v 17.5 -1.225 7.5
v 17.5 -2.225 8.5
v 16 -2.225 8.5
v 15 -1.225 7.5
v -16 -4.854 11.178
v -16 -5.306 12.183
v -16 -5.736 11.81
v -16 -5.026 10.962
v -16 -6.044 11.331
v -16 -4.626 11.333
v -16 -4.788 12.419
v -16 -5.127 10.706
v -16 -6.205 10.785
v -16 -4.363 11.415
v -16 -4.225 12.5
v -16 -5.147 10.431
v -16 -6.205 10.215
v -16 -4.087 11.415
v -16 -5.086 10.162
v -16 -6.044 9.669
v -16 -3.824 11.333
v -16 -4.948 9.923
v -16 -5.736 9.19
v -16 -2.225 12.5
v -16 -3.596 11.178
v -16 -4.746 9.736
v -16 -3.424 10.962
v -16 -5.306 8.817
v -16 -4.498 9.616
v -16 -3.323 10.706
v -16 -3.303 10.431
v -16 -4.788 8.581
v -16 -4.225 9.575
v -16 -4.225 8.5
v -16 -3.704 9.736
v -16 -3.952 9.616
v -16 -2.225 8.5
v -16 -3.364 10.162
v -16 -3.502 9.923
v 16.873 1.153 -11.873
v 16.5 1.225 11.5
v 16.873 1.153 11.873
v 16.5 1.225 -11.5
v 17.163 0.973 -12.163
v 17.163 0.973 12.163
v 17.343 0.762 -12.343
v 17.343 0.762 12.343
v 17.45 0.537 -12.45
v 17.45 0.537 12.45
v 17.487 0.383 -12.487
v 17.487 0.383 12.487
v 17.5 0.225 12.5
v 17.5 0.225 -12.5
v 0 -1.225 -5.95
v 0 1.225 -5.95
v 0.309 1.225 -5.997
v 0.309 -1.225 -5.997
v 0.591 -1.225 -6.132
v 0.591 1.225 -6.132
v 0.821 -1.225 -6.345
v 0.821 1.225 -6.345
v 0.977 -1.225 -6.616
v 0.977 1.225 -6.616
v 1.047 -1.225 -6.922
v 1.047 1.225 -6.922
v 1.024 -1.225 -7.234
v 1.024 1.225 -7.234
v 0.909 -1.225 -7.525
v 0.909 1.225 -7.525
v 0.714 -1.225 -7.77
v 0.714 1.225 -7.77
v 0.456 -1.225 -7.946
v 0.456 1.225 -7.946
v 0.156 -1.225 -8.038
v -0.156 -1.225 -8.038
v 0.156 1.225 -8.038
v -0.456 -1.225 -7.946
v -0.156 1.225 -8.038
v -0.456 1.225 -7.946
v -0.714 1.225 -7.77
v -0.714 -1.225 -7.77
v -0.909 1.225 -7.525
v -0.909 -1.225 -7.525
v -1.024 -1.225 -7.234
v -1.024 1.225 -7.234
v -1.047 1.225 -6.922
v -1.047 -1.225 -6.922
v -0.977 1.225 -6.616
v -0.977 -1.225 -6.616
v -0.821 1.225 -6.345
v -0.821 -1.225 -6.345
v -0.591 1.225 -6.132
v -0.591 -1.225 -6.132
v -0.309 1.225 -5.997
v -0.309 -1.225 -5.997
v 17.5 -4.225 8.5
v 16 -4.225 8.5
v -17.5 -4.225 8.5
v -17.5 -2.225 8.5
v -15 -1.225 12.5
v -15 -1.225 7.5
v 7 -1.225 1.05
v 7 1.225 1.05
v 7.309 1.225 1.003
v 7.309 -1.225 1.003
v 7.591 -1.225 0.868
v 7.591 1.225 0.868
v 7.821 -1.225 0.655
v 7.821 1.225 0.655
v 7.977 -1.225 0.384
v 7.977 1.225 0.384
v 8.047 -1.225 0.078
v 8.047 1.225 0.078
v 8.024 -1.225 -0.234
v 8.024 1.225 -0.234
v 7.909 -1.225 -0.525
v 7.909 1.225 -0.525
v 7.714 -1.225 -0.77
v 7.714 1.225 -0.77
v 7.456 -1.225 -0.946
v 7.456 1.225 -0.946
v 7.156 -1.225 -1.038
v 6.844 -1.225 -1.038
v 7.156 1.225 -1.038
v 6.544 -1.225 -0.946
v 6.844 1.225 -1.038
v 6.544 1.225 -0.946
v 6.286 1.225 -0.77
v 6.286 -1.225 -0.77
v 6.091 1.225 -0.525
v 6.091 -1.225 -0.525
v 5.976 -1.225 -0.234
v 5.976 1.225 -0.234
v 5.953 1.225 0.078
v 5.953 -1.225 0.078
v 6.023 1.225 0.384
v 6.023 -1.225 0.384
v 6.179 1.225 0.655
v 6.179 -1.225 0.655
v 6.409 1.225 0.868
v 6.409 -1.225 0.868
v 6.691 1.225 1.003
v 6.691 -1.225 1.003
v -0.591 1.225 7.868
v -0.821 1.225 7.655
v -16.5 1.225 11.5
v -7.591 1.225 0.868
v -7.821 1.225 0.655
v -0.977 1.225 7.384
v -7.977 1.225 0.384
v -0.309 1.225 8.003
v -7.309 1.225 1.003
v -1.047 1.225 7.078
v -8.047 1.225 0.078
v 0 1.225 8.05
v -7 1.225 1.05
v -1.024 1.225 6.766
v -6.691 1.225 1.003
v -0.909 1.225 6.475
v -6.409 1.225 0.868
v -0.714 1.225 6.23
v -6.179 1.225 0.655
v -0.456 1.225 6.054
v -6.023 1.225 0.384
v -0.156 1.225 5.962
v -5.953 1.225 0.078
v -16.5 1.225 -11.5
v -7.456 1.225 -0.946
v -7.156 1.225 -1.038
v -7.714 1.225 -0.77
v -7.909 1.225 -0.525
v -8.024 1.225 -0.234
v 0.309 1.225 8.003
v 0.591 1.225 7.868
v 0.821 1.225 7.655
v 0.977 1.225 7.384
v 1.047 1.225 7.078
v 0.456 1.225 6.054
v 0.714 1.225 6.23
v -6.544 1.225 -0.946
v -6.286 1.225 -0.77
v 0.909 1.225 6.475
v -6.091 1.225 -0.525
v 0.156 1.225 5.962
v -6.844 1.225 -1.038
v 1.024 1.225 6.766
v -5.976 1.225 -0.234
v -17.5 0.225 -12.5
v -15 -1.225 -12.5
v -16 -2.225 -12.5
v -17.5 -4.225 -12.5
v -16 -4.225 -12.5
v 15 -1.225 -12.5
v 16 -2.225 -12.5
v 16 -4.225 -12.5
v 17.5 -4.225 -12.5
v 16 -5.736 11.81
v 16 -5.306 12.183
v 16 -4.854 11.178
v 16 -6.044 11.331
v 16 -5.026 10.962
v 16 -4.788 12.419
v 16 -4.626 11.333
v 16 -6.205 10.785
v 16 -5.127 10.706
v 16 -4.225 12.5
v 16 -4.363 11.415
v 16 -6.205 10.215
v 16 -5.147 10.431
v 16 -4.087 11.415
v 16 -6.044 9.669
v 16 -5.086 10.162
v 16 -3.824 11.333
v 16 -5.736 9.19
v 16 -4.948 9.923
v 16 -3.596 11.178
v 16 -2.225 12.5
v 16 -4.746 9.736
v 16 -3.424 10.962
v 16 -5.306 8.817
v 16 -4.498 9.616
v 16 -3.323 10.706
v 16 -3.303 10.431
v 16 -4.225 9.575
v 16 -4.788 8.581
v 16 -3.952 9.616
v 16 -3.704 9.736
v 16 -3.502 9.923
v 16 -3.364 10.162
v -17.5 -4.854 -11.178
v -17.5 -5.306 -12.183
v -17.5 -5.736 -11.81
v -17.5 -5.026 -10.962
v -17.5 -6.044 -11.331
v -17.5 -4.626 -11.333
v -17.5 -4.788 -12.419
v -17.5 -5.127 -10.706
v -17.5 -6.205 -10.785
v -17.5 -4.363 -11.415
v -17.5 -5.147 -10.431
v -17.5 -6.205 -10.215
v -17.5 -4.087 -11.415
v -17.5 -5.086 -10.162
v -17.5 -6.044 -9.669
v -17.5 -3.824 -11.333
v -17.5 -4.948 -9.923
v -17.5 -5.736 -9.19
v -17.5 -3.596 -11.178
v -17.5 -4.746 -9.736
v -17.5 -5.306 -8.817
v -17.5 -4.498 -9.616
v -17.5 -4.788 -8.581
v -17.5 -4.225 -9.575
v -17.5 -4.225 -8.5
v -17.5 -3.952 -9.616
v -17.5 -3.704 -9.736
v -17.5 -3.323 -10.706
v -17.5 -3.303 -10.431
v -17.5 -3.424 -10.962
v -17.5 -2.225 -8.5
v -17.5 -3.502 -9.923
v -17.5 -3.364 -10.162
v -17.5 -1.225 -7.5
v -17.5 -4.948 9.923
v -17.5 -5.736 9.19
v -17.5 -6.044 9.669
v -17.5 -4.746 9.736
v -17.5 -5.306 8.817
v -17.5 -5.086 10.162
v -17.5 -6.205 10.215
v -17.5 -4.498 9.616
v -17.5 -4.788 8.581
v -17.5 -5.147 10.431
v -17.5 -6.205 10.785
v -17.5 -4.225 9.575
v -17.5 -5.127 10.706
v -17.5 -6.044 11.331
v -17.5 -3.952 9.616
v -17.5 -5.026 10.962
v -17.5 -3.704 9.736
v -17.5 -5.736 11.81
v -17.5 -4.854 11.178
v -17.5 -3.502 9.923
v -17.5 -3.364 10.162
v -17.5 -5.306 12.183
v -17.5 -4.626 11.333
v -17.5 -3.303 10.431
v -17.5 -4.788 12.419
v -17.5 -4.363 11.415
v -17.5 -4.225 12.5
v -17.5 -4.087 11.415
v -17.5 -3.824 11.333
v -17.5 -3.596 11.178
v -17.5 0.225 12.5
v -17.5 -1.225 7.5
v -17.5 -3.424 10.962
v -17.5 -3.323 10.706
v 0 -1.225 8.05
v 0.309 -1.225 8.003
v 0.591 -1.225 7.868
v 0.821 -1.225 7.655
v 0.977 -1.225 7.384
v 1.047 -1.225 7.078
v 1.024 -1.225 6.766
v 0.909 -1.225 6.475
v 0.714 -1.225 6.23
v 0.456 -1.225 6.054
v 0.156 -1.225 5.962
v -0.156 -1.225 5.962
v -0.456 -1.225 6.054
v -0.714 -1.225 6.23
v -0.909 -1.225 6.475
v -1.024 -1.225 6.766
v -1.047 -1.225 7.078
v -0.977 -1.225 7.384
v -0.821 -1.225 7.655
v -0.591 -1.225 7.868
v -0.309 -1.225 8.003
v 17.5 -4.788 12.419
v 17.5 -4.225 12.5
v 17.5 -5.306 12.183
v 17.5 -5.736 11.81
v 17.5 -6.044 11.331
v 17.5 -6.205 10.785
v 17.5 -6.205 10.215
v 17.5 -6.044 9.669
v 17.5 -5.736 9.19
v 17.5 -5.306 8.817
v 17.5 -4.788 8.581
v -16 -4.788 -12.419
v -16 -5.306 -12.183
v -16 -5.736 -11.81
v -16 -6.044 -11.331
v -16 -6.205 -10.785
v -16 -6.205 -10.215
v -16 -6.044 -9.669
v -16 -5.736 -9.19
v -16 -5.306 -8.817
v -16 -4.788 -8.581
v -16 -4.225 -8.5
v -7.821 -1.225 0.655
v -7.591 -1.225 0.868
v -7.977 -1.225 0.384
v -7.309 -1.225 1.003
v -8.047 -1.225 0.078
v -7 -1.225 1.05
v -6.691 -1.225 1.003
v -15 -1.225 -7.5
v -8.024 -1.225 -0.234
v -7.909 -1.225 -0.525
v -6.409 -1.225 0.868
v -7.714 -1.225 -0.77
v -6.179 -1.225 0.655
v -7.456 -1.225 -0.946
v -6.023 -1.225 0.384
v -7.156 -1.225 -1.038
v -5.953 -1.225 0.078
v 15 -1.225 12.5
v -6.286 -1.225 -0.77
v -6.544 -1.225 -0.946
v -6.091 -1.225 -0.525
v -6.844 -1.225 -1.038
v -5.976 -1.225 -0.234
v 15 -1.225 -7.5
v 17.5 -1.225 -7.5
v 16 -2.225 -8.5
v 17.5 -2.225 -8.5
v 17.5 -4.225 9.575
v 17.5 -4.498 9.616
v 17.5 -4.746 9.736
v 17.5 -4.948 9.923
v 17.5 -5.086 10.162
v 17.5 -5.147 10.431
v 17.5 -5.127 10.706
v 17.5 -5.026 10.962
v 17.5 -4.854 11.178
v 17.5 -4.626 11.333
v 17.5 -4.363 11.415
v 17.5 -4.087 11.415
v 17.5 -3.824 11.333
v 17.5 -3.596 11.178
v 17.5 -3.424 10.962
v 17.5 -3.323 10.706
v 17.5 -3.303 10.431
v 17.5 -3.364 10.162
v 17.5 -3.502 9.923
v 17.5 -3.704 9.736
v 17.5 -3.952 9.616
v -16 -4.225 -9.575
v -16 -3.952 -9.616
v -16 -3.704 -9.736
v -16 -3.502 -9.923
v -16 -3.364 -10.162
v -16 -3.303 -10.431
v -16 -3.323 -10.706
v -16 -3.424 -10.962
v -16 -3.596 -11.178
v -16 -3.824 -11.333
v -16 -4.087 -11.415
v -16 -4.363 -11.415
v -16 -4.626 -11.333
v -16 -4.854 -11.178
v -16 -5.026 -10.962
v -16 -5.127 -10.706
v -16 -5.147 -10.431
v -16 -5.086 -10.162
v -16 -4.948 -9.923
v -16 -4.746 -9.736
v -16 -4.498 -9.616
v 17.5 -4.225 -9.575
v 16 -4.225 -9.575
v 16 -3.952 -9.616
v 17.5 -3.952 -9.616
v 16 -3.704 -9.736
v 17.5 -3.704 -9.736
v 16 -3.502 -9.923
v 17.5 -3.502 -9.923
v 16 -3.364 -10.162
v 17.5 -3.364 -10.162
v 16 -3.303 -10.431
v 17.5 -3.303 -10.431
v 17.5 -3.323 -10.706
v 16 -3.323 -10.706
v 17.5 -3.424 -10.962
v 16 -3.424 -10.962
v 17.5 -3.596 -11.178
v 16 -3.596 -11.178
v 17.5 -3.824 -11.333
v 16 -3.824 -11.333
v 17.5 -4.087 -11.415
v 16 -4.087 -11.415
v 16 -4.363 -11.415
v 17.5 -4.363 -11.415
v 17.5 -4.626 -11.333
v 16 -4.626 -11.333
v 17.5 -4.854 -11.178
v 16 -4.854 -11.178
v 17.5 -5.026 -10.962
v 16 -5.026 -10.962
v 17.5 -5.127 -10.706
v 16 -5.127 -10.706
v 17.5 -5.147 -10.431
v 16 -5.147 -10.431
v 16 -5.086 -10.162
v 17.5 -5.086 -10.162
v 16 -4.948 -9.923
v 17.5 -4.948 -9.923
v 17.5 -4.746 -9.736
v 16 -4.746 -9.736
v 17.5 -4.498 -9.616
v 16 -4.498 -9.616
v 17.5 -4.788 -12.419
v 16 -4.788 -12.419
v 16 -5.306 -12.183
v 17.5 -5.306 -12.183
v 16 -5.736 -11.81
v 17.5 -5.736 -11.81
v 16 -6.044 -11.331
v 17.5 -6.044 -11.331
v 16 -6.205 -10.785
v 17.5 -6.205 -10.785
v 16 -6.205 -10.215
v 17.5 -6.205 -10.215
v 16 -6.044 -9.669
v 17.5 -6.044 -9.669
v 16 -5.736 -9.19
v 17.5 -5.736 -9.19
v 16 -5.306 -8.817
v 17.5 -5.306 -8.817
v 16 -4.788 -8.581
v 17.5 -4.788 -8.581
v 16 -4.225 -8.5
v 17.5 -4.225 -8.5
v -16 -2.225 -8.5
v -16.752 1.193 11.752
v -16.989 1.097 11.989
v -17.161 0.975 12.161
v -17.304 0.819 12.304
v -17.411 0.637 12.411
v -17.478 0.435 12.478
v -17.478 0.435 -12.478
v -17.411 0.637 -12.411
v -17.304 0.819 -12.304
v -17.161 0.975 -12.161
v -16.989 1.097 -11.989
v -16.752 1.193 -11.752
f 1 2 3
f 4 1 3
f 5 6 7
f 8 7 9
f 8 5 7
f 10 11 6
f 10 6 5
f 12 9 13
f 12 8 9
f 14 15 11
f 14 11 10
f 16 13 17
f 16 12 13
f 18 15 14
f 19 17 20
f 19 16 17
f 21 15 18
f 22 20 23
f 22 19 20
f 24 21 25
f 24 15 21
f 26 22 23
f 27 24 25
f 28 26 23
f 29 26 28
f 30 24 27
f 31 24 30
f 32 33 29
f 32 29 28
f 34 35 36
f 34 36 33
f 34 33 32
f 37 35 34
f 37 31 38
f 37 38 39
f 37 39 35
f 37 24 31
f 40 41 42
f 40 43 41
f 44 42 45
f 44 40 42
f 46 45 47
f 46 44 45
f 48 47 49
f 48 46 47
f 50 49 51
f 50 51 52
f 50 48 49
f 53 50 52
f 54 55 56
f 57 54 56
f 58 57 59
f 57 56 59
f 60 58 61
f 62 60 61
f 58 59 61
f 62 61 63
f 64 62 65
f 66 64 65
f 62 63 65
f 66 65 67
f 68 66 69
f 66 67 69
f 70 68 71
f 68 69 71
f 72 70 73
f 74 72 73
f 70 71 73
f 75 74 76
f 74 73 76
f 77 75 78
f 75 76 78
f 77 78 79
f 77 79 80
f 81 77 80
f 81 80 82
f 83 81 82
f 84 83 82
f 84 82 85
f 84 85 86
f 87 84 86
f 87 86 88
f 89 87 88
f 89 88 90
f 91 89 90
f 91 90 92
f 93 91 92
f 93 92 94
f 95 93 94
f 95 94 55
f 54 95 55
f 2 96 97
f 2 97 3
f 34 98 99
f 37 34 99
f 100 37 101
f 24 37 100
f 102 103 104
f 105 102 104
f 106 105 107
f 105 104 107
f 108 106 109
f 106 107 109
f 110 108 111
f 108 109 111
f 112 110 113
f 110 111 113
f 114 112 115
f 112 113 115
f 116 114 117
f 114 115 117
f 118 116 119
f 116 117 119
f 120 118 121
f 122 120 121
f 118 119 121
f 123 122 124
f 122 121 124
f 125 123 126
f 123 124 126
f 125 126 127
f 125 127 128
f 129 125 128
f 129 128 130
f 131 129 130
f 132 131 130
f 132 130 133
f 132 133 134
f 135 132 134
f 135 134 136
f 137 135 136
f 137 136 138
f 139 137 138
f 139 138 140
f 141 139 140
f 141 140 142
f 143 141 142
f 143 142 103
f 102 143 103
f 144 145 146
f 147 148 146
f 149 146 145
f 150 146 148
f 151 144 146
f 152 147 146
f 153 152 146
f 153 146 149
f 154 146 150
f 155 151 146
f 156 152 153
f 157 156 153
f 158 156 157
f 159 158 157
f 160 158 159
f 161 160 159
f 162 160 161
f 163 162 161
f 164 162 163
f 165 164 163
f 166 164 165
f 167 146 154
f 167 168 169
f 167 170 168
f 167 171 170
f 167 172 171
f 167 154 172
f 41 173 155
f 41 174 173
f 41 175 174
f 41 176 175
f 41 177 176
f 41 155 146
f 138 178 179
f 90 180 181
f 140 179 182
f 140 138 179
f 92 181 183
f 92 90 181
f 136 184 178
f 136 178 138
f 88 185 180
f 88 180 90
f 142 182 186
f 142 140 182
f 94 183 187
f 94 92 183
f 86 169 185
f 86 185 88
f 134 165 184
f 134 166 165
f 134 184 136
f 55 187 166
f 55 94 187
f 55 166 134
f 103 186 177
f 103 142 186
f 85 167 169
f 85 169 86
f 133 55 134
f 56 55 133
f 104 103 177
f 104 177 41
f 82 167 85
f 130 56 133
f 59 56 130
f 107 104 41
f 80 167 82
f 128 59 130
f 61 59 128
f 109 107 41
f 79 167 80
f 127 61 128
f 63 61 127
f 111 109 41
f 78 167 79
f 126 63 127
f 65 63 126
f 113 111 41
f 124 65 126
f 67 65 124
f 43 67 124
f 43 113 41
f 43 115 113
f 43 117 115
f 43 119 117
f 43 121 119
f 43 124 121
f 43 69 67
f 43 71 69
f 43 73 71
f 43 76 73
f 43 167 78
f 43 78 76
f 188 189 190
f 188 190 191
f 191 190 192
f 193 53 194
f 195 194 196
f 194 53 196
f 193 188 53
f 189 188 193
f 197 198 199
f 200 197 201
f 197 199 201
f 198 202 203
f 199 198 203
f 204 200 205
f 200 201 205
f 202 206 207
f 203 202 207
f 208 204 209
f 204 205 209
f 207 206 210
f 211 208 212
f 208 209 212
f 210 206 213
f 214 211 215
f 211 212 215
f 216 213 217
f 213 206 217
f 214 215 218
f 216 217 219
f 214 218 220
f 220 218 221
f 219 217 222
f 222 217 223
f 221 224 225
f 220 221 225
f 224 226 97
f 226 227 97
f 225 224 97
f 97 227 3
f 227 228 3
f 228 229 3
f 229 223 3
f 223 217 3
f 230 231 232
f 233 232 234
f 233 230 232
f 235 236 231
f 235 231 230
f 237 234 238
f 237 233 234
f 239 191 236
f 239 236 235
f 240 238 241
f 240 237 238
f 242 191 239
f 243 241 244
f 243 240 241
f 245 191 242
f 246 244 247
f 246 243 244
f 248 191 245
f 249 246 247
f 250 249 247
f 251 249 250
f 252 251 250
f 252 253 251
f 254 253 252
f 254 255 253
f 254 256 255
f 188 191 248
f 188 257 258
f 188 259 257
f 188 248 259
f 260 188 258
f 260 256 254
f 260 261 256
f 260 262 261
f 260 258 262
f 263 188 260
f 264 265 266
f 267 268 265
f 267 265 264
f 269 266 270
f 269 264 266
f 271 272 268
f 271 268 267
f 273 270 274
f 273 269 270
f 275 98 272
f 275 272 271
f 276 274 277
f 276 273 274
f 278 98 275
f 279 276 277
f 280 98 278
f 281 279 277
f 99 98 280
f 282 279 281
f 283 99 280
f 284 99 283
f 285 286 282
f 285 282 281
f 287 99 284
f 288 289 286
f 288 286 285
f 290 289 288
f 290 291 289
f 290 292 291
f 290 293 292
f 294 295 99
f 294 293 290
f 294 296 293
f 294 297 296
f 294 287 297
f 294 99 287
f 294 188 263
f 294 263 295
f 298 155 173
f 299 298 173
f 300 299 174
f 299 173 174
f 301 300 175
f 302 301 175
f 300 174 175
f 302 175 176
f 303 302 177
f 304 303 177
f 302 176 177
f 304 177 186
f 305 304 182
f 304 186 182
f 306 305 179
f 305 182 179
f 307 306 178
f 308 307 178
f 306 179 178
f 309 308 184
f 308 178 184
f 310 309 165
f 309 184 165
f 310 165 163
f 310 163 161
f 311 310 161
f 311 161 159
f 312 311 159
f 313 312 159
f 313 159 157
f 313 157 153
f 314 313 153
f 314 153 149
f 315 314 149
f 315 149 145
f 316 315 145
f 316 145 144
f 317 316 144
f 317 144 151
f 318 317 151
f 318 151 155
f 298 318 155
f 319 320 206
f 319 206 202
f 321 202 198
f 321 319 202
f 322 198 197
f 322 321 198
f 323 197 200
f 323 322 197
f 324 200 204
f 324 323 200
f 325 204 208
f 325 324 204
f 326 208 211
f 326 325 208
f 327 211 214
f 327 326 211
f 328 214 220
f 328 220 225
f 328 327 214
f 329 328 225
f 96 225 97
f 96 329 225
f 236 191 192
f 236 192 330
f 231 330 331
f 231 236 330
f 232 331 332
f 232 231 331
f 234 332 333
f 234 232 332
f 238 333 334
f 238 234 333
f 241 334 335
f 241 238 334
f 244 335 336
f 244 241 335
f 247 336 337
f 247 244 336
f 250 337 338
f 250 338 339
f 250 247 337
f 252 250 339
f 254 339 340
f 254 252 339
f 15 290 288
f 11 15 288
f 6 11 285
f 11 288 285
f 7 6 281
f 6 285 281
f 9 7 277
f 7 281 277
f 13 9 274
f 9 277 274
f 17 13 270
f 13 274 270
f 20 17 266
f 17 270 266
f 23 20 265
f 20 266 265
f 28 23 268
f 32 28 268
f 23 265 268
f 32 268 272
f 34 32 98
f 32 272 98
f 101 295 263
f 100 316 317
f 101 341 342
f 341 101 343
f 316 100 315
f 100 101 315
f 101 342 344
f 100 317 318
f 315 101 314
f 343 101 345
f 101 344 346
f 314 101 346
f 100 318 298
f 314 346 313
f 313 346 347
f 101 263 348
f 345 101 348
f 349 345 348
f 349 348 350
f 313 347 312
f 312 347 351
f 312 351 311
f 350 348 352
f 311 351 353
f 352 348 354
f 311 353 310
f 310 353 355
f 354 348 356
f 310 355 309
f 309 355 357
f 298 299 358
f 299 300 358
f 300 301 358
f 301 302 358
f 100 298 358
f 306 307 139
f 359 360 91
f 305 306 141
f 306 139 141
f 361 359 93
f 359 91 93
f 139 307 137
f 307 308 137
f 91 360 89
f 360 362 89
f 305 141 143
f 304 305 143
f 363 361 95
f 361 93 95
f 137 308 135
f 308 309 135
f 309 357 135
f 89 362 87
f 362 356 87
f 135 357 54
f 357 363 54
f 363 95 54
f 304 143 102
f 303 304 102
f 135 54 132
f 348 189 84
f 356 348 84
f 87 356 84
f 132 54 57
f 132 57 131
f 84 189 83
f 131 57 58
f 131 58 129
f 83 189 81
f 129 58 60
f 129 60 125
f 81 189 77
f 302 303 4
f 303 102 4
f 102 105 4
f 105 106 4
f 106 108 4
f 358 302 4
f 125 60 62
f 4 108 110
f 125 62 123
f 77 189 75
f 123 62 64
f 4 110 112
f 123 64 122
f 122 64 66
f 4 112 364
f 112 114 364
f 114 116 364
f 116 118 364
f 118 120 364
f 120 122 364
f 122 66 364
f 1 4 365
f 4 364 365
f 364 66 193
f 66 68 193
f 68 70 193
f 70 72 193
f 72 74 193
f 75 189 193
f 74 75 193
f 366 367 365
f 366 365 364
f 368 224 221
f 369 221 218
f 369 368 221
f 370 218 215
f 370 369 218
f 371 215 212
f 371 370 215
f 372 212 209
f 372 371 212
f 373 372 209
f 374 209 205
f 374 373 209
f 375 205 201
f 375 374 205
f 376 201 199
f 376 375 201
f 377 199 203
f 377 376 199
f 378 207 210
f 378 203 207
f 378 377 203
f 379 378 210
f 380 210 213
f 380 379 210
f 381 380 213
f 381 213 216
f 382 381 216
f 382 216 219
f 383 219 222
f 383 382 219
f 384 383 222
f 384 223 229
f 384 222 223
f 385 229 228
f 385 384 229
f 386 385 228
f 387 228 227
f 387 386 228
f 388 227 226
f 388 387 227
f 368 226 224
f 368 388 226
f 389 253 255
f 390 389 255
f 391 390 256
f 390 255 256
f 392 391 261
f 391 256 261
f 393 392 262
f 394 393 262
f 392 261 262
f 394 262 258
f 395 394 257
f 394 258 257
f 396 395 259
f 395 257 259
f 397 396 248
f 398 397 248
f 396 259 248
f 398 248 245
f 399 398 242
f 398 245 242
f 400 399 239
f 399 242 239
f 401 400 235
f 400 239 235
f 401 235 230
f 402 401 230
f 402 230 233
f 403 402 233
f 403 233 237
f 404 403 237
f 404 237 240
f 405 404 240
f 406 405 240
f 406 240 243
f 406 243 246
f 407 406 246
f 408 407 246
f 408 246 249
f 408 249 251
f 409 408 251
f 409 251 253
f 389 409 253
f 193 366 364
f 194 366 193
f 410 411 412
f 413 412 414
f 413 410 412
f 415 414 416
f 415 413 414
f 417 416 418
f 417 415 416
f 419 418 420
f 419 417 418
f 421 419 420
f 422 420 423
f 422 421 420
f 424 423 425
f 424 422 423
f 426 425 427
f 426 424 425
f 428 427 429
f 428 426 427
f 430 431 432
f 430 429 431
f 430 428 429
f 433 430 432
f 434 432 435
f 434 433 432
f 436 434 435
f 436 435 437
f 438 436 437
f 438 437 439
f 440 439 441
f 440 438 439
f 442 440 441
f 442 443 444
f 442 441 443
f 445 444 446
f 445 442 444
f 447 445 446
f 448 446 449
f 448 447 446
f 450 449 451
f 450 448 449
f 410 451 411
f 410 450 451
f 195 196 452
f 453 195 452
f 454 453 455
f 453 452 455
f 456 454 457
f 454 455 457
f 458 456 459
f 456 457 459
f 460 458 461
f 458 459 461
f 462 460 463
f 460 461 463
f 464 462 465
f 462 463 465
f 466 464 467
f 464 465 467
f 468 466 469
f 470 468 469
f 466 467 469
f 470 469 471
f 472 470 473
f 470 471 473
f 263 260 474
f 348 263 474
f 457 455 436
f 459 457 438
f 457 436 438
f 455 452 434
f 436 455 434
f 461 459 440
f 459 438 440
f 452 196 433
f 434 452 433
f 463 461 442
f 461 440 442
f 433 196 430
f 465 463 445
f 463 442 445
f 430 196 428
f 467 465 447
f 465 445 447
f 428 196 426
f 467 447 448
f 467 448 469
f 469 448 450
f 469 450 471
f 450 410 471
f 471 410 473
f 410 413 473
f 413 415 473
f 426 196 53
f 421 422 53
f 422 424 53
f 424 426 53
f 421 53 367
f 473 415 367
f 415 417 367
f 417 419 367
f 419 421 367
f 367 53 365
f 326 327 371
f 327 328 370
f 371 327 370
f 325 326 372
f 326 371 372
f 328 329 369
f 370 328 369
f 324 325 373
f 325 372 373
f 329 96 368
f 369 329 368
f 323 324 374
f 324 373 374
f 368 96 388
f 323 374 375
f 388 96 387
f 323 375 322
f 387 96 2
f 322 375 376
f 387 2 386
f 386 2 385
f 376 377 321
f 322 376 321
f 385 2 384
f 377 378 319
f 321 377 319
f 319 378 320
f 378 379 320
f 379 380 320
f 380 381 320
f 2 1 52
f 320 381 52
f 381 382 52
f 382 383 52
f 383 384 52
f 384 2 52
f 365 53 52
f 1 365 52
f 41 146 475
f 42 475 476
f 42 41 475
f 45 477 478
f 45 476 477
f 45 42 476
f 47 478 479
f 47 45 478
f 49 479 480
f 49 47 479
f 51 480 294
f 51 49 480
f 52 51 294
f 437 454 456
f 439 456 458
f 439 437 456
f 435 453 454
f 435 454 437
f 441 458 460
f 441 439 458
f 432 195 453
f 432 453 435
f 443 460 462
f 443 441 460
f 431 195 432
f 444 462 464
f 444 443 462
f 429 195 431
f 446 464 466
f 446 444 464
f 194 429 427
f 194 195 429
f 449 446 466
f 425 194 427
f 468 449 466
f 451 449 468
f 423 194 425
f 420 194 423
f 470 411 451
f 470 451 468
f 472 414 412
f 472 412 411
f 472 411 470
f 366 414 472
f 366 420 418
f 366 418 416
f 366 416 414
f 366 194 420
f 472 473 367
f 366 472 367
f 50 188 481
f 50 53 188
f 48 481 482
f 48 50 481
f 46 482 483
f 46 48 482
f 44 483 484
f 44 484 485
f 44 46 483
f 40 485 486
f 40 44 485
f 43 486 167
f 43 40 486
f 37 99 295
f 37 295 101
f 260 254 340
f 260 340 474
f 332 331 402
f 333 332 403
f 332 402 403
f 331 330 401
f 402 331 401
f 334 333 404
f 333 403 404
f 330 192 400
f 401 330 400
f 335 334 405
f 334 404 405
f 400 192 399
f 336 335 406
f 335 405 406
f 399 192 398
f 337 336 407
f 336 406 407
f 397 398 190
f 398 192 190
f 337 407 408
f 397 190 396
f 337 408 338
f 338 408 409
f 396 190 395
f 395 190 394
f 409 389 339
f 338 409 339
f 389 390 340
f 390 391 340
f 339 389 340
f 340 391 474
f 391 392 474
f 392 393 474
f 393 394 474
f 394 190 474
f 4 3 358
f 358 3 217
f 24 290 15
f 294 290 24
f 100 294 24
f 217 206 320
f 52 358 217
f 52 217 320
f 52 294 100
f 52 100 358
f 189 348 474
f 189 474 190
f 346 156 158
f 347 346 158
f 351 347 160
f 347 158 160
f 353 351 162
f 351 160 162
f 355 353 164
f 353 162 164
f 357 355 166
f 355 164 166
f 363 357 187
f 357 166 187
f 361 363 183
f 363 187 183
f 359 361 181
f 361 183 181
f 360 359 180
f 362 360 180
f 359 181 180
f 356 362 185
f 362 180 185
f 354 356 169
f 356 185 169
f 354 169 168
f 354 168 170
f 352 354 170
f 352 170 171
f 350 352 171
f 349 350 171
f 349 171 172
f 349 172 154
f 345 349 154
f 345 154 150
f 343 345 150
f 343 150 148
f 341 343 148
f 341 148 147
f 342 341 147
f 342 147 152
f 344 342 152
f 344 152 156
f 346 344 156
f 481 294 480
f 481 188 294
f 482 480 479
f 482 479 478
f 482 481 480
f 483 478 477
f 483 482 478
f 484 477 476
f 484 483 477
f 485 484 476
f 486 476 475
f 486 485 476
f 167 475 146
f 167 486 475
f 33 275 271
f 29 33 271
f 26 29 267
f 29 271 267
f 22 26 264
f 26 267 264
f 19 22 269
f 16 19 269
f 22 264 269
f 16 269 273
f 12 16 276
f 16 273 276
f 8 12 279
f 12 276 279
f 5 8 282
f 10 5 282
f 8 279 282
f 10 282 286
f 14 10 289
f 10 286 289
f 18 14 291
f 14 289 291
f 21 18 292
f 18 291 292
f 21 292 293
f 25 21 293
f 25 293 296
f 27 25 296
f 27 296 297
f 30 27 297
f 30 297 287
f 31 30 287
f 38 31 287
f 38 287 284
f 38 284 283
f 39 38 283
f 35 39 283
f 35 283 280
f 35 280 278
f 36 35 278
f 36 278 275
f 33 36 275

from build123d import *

# Parameters (mm, degrees)
SKETCH_1_W          = 35
SKETCH_1_H          = 25
EXTRUDE_1_DEPTH     = 1.225
EXTRUDE_2_DEPTH     = 1.5
SKETCH_4_R          = 0.925
CUT_EXTRUDE_1_DEPTH = 38.682895656
CHAMFER_1_SIZE      = 1
FILLET_1_R          = 1
SKETCH_5_R          = 1.05
CUT_EXTRUDE_2_DEPTH = 23.759668275


with BuildPart() as part:
    # 草图1 → 凸台-拉伸1 (new, symmetric)
    with BuildSketch(Plane(origin=(0, 0, 0), x_dir=(1, 0, 0), z_dir=(0, 1, 0))):
        Rectangle(SKETCH_1_W, SKETCH_1_H)
    extrude(amount=EXTRUDE_1_DEPTH, both=True)

    # 草图2 → 凸台-拉伸2 (add)
    with BuildSketch(Plane.ZY.offset(17.5)):
        with BuildLine():
            Line((-12.5, -1.225), (-12.5, -4.225))
            ThreePointArc((-12.5, -4.225), (-10.5, -6.225), (-8.5, -4.225))
            Line((-8.5, -4.225), (-8.5, -1.225))
            Line((-8.5, -1.225), (-12.5, -1.225))
        make_face()
        with BuildLine():
            Line((8.5, -1.225), (12.5, -1.225))
            Line((12.5, -1.225), (12.5, -4.225))
            ThreePointArc((12.5, -4.225), (10.5, -6.225), (8.5, -4.225))
            Line((8.5, -4.225), (8.5, -1.225))
        make_face()
    extrude_2 = extrude(amount=-EXTRUDE_2_DEPTH)

    # 草图4 → 切除-拉伸1 (cut, through all)
    with BuildSketch(Plane.ZY.offset(17.5)):
        with Locations((-10.5, -4.225)):
            Circle(SKETCH_4_R)
        with Locations(Location((10.5, -4.225, 0), (0, 0, 180))):
            Circle(SKETCH_4_R)
    cut_extrude_1 = extrude(amount=-CUT_EXTRUDE_1_DEPTH, mode=Mode.SUBTRACT)

    # 镜向1: 凸台-拉伸2, 切除-拉伸1 across plane
    add(extrude_2.mirror(Plane(origin=(0, 0, 0), x_dir=(0, 0, 1), z_dir=(1, 0, 0))))
    add(cut_extrude_1.mirror(Plane(origin=(0, 0, 0), x_dir=(0, 0, 1), z_dir=(1, 0, 0))), mode=Mode.SUBTRACT)

    # 倒角1
    chamfer_1_edges = [part.edges().sort_by_distance(p)[0] for p in [
        (-16, -1.225, -10.5),
        (-16.75, -1.225, -8.5),
        (-16, -1.225, 10.5),
        (-16.75, -1.225, 8.5),
        (16.75, -1.225, -8.5),
        (16, -1.225, -10.5),
        (16.75, -1.225, 8.5),
        (16, -1.225, 10.5),
    ]]
    chamfer(chamfer_1_edges, length=CHAMFER_1_SIZE)

    # 圆角1
    fillet_1_edges = [part.edges().sort_by_distance(p)[0] for p in [
        (-17.5, 1.225, 0),
        (0, 1.225, 12.5),
        (17.5, 1.225, 0),
        (0, 1.225, -12.5),
    ]]
    fillet(fillet_1_edges, radius=FILLET_1_R)

    # 草图5 → 切除-拉伸2 (cut, through all)
    with BuildSketch(Plane(origin=(0, 1.225, 0), x_dir=(1, 0, 0), z_dir=(0, 1, 0))):
        with Locations(Location((0, 7, 0), (0, 0, 270))):
            Circle(SKETCH_5_R)
        with Locations(Location((7, 0, 0), (0, 0, 270))):
            Circle(SKETCH_5_R)
        with Locations(Location((-7, 0, 0), (0, 0, 270))):
            Circle(SKETCH_5_R)
        with Locations(Location((0, -7, 0), (0, 0, 270))):
            Circle(SKETCH_5_R)
    extrude(amount=-CUT_EXTRUDE_2_DEPTH, mode=Mode.SUBTRACT)


solid = part.part
